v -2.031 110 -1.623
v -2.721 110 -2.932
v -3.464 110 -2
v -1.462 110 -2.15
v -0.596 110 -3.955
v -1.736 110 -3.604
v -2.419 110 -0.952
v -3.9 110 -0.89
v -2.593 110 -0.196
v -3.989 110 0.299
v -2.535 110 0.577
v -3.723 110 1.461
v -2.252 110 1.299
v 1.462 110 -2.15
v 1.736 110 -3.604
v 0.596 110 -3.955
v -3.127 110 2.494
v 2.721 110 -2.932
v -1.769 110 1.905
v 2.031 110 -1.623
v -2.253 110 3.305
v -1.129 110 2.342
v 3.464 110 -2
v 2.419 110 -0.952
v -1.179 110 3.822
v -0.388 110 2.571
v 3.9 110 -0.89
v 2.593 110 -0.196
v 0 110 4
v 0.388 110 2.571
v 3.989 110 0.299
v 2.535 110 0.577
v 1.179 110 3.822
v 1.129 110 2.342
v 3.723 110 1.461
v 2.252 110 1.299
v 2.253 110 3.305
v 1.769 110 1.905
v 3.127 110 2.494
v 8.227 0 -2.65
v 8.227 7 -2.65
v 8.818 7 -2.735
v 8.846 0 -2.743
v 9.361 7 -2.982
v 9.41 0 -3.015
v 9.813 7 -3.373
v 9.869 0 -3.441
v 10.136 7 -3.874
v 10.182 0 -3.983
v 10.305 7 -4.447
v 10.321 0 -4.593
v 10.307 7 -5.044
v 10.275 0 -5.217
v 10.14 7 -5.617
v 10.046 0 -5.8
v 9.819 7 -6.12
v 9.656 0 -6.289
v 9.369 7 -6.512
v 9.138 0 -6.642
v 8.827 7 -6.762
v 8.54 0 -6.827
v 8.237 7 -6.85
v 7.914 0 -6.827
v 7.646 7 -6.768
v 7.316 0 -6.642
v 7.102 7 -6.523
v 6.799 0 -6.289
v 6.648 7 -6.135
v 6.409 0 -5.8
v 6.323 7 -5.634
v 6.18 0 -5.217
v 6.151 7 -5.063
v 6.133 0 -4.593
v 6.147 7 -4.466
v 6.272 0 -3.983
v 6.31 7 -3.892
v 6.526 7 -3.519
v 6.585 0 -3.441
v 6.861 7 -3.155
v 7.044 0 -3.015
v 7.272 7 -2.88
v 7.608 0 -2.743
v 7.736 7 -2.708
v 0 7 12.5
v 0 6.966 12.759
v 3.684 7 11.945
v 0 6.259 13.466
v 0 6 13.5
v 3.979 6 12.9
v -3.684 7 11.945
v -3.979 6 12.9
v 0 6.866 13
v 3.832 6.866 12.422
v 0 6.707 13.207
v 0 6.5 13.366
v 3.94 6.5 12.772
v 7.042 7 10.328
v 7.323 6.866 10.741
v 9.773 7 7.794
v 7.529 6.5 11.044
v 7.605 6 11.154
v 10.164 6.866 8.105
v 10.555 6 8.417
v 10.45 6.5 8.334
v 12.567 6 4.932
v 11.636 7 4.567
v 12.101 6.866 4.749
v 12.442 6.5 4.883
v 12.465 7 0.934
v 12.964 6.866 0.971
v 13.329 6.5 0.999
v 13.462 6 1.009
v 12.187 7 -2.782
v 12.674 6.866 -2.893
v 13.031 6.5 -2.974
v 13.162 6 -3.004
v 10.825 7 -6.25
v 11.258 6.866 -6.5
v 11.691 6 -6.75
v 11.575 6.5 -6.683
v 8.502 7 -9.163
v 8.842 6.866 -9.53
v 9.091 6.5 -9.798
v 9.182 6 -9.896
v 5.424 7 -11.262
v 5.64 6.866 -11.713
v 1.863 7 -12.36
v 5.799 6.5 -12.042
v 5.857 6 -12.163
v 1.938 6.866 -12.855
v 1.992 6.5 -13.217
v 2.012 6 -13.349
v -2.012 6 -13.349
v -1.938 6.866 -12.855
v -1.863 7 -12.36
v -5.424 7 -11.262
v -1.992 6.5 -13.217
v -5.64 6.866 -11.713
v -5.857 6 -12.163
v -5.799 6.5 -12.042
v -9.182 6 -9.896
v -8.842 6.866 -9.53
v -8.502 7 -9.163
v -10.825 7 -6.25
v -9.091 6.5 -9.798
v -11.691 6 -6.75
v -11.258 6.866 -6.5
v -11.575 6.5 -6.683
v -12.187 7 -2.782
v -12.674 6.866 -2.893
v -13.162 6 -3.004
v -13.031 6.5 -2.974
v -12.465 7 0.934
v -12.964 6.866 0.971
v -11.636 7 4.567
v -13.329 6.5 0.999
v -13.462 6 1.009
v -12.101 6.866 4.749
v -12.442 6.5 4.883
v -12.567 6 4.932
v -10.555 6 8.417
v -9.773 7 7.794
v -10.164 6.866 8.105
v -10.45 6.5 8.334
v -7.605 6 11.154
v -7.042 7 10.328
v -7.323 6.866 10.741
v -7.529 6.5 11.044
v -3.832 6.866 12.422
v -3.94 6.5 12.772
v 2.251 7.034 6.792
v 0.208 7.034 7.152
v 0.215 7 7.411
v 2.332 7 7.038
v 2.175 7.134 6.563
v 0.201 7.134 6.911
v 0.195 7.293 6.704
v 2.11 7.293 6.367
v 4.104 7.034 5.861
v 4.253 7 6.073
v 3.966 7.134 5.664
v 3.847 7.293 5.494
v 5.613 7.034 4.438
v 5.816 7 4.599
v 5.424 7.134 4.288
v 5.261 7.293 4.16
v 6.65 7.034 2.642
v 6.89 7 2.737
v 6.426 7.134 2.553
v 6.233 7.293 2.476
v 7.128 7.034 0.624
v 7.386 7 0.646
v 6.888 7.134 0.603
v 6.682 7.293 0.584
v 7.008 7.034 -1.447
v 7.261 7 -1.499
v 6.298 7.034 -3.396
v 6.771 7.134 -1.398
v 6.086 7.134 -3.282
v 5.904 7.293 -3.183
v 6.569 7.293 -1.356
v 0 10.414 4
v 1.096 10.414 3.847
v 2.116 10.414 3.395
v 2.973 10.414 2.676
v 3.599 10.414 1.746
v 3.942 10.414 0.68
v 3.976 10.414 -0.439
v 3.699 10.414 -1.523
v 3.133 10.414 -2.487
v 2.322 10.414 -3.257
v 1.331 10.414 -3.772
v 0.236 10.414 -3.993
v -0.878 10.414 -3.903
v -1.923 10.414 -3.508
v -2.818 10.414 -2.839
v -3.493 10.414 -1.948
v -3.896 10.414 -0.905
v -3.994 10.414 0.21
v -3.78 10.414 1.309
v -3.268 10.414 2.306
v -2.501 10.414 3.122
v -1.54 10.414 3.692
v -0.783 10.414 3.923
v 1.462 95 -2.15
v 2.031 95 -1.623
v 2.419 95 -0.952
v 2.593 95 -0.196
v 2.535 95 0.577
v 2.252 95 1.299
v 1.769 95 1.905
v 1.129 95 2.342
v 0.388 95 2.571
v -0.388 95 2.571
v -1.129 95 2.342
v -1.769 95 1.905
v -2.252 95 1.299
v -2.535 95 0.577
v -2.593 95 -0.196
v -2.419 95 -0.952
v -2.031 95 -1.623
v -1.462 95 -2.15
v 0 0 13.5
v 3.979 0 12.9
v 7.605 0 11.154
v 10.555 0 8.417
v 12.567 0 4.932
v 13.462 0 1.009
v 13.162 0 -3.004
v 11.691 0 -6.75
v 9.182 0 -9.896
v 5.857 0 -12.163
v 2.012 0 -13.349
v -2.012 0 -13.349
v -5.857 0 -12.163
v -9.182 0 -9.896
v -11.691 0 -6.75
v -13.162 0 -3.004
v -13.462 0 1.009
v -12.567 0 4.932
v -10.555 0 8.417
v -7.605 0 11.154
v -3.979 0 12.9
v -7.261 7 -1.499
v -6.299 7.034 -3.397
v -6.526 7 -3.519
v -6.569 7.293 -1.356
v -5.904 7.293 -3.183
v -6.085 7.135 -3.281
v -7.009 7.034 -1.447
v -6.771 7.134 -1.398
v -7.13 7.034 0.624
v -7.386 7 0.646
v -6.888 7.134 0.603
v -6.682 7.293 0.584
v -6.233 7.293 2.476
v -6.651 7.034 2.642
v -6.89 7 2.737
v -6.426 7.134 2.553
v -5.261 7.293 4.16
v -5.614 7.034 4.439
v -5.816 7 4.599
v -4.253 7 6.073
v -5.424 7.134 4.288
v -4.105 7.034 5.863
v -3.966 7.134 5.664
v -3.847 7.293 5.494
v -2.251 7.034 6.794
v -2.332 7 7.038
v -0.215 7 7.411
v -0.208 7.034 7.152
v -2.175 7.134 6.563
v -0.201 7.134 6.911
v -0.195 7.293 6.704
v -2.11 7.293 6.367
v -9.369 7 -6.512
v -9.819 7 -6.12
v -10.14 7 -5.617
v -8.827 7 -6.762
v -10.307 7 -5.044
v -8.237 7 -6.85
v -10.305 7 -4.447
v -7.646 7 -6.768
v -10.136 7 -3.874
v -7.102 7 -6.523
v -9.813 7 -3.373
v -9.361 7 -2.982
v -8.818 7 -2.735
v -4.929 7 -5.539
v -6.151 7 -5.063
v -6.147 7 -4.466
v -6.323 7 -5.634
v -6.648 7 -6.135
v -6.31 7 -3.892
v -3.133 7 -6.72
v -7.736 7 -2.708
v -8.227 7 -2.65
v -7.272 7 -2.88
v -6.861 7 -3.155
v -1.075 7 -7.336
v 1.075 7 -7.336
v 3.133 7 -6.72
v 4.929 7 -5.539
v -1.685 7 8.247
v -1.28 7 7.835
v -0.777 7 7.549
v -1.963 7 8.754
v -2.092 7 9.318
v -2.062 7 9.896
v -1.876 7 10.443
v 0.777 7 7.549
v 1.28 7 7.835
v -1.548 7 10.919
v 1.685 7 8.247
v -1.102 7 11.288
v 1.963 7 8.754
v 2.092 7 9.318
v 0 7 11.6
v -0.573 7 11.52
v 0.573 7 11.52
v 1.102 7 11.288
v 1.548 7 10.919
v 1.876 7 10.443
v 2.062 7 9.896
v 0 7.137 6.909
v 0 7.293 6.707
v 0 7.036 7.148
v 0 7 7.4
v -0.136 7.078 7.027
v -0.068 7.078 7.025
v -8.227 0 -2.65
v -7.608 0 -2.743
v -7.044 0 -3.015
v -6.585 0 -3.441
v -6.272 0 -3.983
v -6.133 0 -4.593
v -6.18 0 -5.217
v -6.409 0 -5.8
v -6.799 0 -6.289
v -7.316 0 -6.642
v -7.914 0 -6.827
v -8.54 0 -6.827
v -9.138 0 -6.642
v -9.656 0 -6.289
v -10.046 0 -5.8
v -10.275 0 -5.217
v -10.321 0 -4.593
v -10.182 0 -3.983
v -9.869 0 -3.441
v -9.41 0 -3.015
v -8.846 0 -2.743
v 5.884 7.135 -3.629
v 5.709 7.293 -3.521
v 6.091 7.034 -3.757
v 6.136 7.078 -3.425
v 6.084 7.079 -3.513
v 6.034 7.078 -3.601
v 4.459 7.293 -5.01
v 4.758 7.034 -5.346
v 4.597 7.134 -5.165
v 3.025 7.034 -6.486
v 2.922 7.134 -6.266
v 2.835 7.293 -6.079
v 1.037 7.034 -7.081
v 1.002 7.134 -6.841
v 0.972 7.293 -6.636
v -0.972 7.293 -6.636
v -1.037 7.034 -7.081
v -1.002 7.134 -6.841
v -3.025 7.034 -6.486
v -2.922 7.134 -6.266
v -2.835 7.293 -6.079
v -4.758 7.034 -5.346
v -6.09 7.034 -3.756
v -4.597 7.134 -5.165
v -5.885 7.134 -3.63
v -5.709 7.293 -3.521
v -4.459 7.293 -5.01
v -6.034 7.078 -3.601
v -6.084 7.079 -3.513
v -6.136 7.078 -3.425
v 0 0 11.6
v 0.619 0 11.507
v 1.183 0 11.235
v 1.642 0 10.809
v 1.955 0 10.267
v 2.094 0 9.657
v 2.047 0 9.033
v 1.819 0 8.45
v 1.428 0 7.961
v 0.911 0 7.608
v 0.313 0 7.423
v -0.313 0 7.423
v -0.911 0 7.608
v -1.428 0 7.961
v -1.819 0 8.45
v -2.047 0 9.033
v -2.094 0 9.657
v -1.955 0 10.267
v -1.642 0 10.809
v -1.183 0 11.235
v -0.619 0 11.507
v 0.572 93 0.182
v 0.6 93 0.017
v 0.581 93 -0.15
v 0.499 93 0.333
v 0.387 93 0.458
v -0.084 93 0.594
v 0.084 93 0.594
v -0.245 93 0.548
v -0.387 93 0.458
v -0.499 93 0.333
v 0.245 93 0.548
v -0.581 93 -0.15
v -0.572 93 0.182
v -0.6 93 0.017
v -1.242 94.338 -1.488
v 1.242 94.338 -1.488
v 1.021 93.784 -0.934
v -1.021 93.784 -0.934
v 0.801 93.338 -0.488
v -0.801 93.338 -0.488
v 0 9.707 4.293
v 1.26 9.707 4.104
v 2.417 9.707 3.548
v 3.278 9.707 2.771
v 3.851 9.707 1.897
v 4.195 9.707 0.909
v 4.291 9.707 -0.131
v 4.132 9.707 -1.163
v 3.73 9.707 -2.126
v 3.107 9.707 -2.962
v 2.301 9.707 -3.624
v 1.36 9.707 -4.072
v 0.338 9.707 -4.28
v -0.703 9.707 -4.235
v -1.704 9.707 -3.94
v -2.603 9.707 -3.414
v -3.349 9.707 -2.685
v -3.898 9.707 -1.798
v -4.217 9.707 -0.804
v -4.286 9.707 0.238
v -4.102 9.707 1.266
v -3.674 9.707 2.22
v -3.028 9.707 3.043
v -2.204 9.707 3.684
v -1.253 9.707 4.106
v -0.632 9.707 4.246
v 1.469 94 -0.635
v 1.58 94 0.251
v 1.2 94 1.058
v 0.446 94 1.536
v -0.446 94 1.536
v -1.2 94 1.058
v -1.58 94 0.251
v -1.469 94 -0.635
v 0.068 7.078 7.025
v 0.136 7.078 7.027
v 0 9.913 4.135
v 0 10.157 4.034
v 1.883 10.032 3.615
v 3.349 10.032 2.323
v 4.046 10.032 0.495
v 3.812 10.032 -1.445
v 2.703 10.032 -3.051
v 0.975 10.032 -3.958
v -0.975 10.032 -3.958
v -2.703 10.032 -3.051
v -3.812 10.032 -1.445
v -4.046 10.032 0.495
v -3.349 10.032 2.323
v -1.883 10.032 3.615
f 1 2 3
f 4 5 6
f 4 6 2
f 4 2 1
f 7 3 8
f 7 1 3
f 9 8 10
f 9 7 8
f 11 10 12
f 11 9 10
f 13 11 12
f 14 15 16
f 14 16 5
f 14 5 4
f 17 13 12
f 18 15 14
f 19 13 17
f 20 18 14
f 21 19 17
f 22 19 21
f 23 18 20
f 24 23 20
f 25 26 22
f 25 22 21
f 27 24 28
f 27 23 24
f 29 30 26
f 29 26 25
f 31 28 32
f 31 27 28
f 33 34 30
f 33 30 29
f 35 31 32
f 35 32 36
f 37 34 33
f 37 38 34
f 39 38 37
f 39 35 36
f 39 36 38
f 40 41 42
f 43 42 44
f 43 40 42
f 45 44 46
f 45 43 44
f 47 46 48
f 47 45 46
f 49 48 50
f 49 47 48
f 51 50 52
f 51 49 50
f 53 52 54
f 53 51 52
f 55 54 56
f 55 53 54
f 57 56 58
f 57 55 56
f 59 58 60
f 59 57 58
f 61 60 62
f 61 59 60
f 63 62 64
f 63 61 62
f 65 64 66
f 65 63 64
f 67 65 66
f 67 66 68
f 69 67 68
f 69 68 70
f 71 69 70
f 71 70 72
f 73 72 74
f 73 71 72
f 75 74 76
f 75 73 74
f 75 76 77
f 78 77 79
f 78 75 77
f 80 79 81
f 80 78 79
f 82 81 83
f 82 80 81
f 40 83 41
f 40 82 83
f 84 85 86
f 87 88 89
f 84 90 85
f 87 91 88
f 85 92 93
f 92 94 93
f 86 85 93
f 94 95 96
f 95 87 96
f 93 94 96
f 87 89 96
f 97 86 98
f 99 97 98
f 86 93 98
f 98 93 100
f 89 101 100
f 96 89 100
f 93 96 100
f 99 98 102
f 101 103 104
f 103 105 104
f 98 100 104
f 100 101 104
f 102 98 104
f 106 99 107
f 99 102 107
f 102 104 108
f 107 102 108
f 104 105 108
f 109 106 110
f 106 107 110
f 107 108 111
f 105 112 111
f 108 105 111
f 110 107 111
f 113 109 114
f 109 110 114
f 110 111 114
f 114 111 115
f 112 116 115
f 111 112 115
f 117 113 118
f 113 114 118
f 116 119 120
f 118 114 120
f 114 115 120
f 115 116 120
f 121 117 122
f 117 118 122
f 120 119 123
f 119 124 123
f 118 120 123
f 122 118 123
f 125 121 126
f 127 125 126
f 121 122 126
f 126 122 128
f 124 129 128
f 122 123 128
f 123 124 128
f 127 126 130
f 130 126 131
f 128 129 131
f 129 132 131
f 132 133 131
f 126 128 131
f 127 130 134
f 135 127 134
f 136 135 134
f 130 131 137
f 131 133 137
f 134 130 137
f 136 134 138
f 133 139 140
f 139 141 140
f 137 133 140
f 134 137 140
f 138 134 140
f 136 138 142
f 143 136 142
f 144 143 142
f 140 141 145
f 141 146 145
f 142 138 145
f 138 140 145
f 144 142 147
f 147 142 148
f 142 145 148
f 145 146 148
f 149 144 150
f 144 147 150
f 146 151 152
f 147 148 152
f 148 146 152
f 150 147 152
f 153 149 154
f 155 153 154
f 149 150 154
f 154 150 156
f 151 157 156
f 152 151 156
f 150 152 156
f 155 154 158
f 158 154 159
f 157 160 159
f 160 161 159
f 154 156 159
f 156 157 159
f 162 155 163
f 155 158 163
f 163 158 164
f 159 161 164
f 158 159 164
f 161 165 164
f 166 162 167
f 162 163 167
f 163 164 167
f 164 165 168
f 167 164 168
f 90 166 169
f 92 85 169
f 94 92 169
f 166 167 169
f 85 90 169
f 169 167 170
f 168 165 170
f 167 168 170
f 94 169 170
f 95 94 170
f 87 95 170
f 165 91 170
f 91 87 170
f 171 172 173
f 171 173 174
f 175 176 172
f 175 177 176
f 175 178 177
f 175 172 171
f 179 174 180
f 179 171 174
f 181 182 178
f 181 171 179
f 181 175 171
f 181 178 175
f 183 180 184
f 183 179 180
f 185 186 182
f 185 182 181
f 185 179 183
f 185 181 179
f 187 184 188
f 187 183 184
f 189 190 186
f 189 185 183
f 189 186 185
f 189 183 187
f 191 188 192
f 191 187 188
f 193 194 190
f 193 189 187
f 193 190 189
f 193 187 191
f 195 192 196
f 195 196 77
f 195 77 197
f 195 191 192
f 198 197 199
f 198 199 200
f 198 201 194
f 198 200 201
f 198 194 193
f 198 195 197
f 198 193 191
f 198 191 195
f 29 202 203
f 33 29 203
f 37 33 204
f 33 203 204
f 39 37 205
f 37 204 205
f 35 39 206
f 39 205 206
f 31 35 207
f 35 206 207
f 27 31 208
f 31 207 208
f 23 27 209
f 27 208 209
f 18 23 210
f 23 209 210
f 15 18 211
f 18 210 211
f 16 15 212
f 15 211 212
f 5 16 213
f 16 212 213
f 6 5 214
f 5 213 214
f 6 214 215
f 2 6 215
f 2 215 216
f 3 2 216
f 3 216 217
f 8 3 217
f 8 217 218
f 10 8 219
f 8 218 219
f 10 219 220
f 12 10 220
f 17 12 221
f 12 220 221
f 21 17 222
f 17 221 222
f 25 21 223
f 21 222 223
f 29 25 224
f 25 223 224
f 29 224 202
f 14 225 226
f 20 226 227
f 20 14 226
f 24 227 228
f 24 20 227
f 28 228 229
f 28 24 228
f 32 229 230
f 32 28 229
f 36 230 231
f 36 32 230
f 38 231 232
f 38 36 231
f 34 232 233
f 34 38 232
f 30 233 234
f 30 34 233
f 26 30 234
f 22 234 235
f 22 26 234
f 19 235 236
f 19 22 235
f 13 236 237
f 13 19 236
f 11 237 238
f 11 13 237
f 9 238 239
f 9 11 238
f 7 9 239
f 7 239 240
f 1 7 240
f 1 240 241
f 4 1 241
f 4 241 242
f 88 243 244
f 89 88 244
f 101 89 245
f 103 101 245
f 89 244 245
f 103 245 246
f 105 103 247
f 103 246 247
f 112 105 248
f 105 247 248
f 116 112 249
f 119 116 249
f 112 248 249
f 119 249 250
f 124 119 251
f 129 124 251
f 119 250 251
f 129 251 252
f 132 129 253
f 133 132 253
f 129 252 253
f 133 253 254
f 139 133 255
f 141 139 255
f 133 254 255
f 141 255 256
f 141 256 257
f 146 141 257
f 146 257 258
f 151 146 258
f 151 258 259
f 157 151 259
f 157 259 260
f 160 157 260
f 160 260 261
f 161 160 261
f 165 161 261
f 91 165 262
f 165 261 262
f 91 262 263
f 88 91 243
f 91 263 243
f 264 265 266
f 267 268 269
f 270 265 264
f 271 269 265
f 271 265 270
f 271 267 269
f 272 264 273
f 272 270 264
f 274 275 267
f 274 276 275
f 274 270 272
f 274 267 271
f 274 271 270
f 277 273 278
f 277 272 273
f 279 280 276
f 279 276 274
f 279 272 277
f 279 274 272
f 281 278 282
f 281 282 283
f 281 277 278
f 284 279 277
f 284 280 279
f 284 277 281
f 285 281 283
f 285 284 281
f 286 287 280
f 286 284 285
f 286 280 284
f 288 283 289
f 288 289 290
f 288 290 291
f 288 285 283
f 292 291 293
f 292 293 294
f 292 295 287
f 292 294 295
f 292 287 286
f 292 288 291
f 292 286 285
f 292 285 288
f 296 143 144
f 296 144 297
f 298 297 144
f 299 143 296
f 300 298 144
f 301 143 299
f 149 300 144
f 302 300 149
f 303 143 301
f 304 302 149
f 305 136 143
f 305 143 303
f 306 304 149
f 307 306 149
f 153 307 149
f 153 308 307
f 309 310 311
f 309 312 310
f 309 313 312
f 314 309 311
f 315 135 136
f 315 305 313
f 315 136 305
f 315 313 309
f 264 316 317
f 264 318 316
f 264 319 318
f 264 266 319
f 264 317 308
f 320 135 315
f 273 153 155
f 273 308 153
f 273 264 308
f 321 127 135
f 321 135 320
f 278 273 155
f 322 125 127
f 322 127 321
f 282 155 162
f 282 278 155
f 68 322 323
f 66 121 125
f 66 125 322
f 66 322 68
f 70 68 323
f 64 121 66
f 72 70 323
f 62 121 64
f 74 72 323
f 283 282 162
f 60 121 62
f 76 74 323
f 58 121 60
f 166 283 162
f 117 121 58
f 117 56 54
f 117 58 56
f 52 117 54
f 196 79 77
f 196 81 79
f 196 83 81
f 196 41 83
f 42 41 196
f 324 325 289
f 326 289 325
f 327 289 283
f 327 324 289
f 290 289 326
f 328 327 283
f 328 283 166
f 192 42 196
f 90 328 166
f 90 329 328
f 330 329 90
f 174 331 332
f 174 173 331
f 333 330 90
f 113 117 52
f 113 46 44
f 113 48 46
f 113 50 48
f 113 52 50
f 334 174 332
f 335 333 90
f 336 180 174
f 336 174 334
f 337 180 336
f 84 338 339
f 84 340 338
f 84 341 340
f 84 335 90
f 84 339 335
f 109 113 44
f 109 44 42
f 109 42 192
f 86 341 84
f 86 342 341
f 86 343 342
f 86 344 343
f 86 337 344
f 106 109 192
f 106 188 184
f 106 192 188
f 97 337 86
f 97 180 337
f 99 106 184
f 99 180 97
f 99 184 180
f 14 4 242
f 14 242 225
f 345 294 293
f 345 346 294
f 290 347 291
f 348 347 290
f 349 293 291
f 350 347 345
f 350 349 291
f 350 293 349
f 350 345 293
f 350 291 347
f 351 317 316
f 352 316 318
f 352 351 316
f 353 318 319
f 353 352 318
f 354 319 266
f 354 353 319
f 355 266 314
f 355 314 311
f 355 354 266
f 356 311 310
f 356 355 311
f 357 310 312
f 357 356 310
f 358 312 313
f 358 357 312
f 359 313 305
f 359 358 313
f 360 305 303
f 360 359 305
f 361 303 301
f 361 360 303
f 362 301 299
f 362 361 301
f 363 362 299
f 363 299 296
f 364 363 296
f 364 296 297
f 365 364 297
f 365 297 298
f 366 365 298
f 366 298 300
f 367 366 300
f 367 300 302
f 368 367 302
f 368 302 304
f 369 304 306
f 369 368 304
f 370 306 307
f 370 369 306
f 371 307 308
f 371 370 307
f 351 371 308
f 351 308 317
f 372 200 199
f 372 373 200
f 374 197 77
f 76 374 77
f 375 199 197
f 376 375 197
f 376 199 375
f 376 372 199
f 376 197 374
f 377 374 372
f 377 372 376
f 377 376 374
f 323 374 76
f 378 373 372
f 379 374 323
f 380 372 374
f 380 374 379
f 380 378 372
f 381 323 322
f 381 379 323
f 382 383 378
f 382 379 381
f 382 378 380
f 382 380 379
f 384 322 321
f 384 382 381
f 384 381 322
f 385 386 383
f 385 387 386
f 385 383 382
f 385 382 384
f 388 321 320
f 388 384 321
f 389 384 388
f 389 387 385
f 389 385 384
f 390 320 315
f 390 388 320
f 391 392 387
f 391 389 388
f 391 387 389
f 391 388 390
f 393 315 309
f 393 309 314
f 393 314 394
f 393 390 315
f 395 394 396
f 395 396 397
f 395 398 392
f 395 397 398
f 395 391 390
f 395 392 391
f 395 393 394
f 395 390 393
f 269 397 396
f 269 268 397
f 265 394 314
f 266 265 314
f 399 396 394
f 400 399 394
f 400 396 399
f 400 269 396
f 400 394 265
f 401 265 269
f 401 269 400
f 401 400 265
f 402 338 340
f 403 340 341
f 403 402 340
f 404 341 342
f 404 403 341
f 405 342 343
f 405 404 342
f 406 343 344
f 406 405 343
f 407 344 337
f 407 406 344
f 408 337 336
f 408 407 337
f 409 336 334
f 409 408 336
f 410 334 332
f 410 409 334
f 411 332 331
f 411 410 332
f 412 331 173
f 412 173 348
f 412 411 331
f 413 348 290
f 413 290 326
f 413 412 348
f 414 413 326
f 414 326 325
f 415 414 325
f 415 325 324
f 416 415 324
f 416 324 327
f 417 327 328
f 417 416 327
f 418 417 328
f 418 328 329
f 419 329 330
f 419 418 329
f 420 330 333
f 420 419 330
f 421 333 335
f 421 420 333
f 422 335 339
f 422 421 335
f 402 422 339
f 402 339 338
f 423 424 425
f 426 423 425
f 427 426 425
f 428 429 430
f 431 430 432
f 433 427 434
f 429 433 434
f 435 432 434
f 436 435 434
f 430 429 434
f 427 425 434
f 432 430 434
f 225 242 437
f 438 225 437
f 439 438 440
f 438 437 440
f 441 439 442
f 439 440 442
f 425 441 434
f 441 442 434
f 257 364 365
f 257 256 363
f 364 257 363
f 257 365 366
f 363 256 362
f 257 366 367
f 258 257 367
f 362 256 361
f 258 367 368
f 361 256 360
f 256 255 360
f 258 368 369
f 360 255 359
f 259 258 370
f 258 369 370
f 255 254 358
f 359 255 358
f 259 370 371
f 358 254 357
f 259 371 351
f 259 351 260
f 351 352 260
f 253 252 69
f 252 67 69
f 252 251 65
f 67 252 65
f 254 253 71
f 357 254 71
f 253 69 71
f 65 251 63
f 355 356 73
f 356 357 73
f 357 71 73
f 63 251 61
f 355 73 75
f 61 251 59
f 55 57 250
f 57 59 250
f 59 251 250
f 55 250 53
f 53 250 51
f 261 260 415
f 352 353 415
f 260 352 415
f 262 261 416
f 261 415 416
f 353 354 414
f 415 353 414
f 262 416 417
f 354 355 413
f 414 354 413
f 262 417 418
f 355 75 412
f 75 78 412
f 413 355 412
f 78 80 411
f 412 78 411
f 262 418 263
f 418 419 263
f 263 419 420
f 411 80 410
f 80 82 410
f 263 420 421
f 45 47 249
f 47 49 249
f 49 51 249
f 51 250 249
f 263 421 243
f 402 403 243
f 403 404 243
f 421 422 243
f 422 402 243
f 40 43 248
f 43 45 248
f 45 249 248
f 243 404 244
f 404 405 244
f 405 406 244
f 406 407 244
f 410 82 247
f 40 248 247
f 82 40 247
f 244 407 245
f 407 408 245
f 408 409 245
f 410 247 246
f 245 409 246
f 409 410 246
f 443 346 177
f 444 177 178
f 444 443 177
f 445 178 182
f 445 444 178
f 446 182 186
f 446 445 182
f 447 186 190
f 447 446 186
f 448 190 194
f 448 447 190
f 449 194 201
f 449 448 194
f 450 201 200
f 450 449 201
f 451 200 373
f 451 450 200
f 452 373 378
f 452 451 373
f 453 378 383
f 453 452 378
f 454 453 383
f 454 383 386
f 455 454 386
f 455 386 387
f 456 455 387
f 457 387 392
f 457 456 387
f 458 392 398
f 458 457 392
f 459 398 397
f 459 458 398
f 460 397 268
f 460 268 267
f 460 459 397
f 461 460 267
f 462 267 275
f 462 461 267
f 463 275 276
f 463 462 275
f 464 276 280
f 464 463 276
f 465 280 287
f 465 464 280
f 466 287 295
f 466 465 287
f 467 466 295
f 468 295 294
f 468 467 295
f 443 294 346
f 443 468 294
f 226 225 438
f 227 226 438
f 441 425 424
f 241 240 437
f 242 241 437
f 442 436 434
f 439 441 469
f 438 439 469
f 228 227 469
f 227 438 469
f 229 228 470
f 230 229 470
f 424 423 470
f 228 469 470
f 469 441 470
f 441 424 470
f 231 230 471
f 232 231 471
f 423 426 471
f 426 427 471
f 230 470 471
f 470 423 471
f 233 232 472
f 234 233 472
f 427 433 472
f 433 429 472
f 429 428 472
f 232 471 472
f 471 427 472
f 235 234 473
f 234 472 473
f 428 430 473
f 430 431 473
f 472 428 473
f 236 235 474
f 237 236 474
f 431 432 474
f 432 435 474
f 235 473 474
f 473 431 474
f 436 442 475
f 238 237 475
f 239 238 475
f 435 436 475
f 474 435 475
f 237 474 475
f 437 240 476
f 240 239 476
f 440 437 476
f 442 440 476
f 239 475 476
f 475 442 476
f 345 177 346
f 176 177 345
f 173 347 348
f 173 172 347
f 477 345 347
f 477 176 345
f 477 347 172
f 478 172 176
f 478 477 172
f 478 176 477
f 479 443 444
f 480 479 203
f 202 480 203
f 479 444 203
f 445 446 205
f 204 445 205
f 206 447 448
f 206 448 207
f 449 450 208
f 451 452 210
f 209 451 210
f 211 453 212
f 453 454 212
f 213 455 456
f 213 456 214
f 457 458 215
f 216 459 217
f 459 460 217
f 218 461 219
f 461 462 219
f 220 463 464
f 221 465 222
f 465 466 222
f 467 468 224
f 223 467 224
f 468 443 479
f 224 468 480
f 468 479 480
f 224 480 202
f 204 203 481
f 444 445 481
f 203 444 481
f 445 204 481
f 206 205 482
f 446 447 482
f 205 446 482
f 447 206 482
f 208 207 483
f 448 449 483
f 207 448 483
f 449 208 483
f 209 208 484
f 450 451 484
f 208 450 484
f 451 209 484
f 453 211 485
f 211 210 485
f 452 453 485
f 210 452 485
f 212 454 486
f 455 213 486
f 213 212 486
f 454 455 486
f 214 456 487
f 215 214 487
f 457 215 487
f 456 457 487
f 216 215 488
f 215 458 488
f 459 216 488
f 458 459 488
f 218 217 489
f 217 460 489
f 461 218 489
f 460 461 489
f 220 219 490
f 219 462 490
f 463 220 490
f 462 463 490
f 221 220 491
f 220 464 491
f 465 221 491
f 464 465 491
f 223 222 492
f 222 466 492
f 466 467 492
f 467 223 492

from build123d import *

# Parameters (mm, degrees)
SKETCH1_R           = 13.5
SKETCH1_R_2         = 2.1
BOSS_EXTRUDE1_DEPTH = 7
BOSS_EXTRUDE2_START = 7
SKETCH1_3_R         = 4
BOSS_EXTRUDE2_DEPTH = 103
CUT_EXTRUDE1_DEPTH  = 17
CHAMFER1_SIZE       = 3
FILLET3_R           = 1
CHAMFER2_SIZE       = 2


with BuildPart() as part:
    # Sketch1 → Boss-Extrude1 (new body)
    with BuildSketch(Plane(origin=(0, 0, 0), x_dir=(1, 0, 0), z_dir=(0, 1, 0))):
        with Locations(Location((0, 0, 0), (0, 0, 270))):
            Circle(SKETCH1_R)
        with Locations(Location((0, -9.5, 0), (0, 0, 270))):
            Circle(SKETCH1_R_2, mode=Mode.SUBTRACT)
        with Locations(Location((-8.227241336, 4.75, 0), (0, 0, 270))):
            Circle(SKETCH1_R_2, mode=Mode.SUBTRACT)
        with Locations(Location((8.227241336, 4.75, 0), (0, 0, 270))):
            Circle(SKETCH1_R_2, mode=Mode.SUBTRACT)
    extrude(amount=BOSS_EXTRUDE1_DEPTH)

    # Sketch1<3> → Boss-Extrude2 (add)
    with BuildSketch(Plane(origin=(0, 0, 0), x_dir=(1, 0, 0), z_dir=(0, 1, 0)).offset(BOSS_EXTRUDE2_START)):
        with Locations(Location((0, 0, 0), (0, 0, 270))):
            Circle(SKETCH1_3_R)
    extrude(amount=BOSS_EXTRUDE2_DEPTH)

    # Sketch2 → Cut-Extrude1 (cut)
    with BuildSketch(Plane(origin=(0, 110, 0), x_dir=(1, 0, 0), z_dir=(0, 1, 0))):
        with BuildLine():
            Line((-1.462019152, 2.15), (1.462019152, 2.15))
            ThreePointArc((1.462019152, 2.15), (0, -2.6), (-1.462019152, 2.15))
        make_face()
    extrude(amount=-CUT_EXTRUDE1_DEPTH, mode=Mode.SUBTRACT)

    # Chamfer1
    chamfer1_edges = [part.edges().sort_by_distance(p)[0] for p in [
        (0, 7, -4),
    ]]
    chamfer(chamfer1_edges, length=CHAMFER1_SIZE)

    # Fillet3
    fillet3_edges = [part.edges().sort_by_distance(p)[0] for p in [
        (0, 7, -13.5),
        (0, 10, -4),
        (0, 7, -7),
    ]]
    fillet(fillet3_edges, radius=FILLET3_R)

    # Chamfer2
    # the kernel refuses this chamfer: 2 mm, written as the material it adds along each edge
    with BuildSketch(Plane(origin=(0, 93, 0), x_dir=(0.003141587485879782, 0, -0.9999950652018581), z_dir=(-0.9999950652018581, 0, -0.003141587485879782))) as chamfer2_piece_1:
        Polygon((2.6, -CHAMFER2_SIZE), (2.6 - CHAMFER2_SIZE, 0), (2.6, 0), align=None)
    revolve(axis=Axis((0, 93, 0), (0, -1, 0)), revolution_arc=359.64)
    with BuildSketch(Plane(origin=(-6.605385128, 93, -2.15), x_dir=(0, 0.9996219169112968, -0.0274958766105862), z_dir=(1, 0, 0))) as chamfer2_piece_2_section:
        Polygon((CHAMFER2_SIZE * 0.999621916911, CHAMFER2_SIZE * 0.0274958766106), (-CHAMFER2_SIZE * 0.0274958766106, CHAMFER2_SIZE * 0.999621916911), (0, 0), align=None)
    chamfer2_piece_2 = extrude(amount=13.210770255, mode=Mode.PRIVATE)
    chamfer2_piece_2 = chamfer2_piece_2 & Plane(origin=(0, 93.615158387, 0), x_dir=(0.5623150583543634, 0, -0.826923076923077), z_dir=(0, 1, 0)) * Cylinder(2.6, 35, mode=Mode.PRIVATE)
    add(chamfer2_piece_2)


solid = part.part
